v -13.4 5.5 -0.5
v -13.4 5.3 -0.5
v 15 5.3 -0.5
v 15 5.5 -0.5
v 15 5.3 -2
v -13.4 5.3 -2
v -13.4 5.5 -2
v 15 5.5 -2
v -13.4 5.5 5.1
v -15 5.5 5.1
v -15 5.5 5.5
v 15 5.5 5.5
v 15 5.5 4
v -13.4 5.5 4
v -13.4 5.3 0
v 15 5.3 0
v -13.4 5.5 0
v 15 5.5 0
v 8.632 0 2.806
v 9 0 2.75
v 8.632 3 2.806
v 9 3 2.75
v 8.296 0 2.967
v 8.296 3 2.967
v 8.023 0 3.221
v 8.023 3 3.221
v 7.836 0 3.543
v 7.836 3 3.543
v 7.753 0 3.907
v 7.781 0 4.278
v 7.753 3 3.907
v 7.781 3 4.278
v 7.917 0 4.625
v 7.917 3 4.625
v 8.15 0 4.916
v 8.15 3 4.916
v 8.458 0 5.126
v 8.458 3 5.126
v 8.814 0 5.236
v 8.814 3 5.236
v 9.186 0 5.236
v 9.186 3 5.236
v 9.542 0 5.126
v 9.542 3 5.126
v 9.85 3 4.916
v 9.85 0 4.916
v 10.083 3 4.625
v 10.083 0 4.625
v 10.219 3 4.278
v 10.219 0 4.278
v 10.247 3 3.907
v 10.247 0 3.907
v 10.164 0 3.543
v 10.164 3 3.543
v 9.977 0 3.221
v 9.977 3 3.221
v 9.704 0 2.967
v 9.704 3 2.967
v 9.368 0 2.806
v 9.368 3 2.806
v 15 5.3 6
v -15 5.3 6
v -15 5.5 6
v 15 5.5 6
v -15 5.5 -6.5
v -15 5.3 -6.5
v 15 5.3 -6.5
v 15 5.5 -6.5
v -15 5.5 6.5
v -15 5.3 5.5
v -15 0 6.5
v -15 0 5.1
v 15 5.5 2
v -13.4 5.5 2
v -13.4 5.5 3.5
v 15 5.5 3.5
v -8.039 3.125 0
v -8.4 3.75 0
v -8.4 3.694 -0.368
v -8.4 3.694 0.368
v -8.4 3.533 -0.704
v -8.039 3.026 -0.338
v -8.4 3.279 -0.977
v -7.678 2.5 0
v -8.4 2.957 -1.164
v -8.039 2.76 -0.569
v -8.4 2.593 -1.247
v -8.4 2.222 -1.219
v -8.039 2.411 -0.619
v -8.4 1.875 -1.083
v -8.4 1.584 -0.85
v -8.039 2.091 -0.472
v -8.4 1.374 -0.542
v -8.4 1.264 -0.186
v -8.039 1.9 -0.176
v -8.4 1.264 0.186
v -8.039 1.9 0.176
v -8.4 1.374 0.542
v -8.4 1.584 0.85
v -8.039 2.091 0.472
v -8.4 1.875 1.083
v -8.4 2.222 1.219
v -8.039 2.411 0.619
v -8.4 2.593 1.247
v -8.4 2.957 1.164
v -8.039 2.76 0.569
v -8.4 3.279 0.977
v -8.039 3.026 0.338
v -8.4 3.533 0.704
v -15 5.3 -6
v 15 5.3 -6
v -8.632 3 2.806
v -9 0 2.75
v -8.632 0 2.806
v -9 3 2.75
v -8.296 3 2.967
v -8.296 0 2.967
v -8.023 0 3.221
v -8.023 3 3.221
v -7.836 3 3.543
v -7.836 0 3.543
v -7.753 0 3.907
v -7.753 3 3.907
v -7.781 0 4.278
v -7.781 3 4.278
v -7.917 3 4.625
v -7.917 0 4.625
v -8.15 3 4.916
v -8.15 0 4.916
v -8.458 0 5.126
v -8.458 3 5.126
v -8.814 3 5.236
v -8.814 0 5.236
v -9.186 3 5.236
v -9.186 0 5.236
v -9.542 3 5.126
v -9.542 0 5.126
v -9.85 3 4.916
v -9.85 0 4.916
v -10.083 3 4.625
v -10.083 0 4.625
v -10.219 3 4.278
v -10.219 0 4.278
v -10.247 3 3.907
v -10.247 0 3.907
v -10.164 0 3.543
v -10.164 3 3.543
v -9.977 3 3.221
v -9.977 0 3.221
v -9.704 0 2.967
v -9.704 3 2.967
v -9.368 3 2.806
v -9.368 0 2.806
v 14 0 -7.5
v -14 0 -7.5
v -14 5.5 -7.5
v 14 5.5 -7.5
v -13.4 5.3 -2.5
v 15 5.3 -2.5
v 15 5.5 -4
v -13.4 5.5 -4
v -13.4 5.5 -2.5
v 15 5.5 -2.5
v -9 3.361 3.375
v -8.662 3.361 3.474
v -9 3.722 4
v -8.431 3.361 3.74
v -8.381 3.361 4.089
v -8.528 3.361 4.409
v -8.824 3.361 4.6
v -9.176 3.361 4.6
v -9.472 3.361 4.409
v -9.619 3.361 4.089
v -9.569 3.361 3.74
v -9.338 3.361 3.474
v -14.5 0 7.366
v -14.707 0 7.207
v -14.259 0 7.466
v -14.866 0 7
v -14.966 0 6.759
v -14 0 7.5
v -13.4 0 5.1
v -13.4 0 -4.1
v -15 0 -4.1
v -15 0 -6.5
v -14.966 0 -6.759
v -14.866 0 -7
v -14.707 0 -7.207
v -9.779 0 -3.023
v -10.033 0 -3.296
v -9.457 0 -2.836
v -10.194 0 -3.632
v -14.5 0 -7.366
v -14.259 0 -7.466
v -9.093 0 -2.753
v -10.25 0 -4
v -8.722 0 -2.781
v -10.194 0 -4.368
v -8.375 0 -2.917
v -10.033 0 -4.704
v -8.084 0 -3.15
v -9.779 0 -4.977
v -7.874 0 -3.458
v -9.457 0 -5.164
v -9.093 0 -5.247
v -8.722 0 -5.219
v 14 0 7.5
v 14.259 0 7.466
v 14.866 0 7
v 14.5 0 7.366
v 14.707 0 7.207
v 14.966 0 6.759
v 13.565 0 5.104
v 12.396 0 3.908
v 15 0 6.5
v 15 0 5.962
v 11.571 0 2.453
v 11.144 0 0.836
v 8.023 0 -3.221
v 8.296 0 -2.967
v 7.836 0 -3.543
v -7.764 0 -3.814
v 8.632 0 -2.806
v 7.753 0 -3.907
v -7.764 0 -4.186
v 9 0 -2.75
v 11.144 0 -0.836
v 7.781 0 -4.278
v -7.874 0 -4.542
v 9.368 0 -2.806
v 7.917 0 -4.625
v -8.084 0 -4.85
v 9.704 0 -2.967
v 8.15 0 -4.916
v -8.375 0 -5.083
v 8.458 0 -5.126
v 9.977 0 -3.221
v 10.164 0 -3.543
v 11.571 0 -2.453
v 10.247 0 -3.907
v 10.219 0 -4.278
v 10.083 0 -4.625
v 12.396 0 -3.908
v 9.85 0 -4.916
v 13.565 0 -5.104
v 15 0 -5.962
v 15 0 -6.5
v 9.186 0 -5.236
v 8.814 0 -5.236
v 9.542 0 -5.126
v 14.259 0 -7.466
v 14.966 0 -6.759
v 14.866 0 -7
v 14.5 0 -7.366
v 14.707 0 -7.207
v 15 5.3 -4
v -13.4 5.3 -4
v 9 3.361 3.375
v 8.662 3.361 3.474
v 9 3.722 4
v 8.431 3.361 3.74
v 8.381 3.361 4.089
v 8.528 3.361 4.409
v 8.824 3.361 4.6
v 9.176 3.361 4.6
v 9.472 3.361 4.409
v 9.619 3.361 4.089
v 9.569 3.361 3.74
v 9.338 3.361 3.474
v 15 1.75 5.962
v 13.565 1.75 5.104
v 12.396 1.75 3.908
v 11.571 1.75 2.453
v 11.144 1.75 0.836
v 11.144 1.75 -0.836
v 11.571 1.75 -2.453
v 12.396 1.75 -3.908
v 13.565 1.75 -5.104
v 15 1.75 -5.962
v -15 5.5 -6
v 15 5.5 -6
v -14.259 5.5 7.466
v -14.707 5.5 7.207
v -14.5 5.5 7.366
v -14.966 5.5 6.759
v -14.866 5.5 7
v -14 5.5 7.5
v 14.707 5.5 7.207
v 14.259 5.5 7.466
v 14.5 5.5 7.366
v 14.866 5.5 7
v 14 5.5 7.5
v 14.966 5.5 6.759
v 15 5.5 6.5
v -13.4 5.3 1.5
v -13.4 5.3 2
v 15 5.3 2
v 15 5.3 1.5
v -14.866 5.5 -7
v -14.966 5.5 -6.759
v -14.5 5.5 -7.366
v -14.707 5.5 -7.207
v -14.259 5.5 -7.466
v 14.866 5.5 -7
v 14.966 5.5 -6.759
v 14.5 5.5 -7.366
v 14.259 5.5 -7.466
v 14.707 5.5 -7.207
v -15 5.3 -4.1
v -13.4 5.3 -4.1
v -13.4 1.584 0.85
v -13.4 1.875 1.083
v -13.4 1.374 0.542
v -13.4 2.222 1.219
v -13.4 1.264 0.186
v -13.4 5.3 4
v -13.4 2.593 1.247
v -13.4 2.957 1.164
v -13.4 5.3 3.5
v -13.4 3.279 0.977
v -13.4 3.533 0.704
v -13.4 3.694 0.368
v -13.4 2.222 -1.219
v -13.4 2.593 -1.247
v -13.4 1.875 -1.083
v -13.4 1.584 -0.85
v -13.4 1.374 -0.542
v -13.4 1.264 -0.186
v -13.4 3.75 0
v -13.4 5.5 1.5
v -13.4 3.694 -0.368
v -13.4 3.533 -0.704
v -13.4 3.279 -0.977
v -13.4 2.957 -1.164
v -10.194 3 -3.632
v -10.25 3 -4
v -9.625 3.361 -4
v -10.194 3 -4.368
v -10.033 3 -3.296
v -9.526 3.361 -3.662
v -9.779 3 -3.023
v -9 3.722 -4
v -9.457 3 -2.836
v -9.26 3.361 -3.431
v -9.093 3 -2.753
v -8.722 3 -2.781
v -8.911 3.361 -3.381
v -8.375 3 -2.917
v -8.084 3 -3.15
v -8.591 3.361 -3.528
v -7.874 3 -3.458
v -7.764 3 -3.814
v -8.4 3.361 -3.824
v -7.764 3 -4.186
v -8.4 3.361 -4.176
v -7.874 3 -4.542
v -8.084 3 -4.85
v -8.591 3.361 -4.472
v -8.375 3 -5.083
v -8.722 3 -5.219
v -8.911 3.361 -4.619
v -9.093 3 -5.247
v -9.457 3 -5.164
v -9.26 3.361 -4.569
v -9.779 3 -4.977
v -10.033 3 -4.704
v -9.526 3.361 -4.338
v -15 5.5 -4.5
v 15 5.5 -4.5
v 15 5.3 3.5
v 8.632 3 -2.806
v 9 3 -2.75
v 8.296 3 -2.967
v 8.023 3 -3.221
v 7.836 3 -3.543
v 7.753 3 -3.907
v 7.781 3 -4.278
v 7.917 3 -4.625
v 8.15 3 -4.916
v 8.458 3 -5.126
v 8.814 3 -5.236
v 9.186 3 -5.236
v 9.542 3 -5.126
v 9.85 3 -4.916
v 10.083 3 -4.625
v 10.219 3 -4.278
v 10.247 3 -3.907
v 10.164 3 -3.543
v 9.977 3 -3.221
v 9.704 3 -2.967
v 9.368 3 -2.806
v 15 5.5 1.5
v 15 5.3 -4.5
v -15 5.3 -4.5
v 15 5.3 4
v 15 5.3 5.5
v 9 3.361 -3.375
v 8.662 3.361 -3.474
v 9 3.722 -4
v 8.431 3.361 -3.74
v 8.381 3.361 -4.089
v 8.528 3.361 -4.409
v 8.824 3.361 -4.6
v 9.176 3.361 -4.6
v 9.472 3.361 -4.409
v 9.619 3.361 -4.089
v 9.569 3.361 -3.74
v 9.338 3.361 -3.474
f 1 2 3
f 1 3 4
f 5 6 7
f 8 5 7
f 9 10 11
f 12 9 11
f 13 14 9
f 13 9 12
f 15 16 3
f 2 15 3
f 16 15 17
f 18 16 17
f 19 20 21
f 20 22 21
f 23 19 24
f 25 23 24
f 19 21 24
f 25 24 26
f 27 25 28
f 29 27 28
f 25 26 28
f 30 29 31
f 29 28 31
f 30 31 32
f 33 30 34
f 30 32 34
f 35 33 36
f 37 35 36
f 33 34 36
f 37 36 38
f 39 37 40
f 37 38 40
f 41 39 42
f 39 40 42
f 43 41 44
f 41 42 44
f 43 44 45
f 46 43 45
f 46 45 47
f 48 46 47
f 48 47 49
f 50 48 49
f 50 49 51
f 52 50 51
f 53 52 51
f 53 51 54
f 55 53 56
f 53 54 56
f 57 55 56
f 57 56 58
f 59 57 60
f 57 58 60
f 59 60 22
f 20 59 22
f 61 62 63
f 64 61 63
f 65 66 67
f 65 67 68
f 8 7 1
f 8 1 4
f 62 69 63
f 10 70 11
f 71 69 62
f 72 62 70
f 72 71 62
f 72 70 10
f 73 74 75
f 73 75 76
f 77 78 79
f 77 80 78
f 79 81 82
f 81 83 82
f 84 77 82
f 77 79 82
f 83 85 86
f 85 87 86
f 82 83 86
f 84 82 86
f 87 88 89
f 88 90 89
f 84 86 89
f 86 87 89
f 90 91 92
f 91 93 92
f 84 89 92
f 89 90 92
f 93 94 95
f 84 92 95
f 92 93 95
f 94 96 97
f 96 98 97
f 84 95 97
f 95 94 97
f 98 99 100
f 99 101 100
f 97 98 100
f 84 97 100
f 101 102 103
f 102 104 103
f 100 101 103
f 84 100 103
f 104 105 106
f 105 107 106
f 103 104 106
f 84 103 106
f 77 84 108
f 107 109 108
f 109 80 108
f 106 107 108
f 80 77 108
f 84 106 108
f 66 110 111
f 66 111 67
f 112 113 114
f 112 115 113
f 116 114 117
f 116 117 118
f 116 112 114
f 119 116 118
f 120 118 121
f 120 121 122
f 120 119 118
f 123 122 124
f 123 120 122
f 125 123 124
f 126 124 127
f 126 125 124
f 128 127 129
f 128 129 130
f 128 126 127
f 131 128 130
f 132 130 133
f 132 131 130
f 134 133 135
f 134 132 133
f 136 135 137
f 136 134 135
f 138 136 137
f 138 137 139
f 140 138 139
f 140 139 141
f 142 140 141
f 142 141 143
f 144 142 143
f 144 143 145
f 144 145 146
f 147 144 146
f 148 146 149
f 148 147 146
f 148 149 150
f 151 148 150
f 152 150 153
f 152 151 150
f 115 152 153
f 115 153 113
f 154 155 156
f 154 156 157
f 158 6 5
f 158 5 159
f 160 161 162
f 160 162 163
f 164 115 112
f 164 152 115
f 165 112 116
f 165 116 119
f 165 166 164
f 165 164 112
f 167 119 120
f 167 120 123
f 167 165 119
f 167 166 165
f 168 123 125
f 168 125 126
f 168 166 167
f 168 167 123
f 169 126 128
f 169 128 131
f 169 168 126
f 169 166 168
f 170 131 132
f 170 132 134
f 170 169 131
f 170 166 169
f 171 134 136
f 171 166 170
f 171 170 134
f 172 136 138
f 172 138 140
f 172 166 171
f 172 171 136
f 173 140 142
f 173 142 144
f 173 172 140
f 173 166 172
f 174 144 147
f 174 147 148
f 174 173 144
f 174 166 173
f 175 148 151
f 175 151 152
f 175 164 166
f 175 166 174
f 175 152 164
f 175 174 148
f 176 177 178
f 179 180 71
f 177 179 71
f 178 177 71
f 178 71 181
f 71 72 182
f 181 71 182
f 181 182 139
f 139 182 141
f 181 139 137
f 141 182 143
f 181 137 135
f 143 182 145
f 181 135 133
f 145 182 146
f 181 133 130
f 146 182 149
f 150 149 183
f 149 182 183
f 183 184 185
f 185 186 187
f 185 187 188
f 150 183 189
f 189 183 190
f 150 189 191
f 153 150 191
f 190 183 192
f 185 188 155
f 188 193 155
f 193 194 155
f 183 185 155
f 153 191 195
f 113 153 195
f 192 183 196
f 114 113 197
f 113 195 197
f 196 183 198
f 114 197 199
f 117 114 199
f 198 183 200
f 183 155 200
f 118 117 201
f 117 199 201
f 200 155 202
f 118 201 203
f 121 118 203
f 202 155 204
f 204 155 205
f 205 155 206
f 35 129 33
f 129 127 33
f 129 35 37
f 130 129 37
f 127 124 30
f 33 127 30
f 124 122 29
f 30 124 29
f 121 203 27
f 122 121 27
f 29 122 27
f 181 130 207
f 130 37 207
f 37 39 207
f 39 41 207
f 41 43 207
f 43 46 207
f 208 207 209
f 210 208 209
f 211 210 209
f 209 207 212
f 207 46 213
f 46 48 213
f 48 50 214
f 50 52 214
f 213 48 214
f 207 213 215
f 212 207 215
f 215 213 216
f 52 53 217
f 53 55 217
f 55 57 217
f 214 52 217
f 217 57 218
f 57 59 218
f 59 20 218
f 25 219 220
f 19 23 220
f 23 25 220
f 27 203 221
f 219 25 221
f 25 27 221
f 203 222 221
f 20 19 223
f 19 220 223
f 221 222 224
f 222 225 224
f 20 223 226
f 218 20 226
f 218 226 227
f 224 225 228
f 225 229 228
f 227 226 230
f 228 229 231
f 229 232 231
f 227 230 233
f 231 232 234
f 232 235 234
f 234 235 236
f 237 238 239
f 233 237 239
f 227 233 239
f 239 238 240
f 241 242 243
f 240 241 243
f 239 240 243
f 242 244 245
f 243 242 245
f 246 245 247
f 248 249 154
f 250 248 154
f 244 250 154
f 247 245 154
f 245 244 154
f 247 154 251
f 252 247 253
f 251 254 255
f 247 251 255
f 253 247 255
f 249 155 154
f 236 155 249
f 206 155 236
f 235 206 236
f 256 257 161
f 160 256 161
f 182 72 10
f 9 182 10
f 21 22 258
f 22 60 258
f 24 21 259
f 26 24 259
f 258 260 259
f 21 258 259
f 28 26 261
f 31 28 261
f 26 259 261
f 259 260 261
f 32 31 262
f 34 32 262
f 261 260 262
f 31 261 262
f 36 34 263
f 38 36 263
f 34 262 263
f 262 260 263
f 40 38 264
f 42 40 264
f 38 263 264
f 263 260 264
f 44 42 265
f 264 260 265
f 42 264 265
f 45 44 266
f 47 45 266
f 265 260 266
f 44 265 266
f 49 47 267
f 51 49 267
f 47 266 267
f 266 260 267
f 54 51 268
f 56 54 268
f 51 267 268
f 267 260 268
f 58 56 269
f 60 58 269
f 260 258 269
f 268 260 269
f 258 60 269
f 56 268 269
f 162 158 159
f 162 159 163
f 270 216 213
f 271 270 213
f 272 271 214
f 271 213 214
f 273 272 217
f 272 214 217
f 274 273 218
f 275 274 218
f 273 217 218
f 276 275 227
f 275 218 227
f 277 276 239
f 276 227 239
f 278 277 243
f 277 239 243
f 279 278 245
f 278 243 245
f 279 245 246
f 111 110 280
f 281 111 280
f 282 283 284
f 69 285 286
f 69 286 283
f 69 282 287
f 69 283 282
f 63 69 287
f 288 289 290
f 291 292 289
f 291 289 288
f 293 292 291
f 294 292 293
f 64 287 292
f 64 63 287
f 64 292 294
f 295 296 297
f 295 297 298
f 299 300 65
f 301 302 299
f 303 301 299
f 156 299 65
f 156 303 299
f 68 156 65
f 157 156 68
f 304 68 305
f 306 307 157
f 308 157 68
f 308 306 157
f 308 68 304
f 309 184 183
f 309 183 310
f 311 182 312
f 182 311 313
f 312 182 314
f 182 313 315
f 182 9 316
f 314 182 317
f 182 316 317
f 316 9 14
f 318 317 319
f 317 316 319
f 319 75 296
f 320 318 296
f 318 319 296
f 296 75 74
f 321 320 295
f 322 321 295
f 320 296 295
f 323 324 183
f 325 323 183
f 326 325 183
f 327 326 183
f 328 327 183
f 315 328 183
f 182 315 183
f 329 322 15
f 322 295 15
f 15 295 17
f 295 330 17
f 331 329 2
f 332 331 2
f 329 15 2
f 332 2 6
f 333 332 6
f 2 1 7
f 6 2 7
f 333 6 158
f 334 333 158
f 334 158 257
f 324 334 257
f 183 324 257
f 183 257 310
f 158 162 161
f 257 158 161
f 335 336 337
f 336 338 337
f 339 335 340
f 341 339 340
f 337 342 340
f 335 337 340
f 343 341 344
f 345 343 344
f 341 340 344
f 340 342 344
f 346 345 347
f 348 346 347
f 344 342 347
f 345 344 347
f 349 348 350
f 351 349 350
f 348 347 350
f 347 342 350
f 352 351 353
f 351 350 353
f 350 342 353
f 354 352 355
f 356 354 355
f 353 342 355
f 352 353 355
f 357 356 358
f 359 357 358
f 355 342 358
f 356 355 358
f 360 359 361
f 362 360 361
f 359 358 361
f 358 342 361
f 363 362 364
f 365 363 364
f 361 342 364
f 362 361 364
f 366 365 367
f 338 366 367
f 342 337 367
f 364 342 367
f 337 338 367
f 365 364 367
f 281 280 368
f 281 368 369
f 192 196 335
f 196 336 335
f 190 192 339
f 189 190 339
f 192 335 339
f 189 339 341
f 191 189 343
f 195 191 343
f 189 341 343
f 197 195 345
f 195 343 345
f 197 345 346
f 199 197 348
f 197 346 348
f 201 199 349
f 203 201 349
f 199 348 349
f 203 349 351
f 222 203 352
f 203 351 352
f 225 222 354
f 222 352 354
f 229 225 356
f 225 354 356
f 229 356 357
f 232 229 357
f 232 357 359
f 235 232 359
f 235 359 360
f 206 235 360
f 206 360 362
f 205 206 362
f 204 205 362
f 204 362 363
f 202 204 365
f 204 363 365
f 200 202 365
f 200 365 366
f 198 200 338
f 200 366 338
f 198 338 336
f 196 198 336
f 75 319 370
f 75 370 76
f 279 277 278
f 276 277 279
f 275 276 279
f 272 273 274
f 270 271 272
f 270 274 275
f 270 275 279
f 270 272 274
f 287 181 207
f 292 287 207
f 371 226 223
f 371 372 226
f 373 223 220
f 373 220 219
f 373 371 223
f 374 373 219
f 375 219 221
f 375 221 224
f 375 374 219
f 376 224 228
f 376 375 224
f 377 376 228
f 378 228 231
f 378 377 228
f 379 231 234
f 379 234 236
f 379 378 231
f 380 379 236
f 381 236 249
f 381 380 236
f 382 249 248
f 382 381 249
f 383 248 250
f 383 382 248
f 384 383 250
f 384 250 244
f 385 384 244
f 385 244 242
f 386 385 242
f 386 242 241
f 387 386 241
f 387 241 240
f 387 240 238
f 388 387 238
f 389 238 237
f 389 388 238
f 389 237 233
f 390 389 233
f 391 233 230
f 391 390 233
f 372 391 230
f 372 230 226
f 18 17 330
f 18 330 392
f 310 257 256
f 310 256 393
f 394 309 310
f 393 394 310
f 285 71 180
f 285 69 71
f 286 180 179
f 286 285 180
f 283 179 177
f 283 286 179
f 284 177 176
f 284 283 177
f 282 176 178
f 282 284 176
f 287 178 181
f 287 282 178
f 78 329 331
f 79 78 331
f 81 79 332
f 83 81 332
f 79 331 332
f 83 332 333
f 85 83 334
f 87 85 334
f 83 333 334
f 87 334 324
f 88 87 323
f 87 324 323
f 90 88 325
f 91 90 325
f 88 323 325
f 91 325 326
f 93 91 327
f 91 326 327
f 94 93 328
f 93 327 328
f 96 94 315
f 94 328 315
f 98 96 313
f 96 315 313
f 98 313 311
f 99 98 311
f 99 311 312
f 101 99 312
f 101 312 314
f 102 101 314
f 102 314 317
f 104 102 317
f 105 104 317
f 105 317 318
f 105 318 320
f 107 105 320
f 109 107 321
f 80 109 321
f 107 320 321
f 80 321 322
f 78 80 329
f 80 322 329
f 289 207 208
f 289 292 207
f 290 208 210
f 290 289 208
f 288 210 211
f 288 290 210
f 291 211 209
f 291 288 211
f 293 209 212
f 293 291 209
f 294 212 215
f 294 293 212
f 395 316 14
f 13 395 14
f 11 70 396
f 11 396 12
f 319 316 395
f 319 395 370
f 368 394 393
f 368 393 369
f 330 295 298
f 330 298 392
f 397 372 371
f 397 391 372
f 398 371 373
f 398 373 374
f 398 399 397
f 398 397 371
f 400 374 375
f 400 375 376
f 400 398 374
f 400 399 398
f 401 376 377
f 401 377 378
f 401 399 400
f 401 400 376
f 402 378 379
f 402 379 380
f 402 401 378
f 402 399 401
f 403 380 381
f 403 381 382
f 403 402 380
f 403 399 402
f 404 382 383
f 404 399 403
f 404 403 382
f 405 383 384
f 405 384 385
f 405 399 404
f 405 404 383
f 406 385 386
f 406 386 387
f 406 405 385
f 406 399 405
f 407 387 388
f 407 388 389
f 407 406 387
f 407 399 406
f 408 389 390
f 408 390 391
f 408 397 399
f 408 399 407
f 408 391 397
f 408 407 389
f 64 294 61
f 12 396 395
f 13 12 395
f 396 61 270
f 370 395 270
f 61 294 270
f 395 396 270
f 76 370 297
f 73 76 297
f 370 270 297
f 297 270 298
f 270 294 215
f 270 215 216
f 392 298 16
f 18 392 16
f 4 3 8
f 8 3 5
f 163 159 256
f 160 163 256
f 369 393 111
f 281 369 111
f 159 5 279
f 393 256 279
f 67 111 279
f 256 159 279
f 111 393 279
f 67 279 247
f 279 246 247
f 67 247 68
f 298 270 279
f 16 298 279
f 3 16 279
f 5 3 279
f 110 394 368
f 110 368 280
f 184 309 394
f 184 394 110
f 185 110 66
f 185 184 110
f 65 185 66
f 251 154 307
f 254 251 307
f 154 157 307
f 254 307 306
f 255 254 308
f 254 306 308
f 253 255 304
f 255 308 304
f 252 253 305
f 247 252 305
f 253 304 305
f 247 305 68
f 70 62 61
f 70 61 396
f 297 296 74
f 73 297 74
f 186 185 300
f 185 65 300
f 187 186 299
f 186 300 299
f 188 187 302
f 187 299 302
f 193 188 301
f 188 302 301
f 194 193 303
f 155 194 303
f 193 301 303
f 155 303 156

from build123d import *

# Parameters (mm, degrees)
SKETCH1_W               = 30
SKETCH1_H               = 15
BOSS_EXTRUDE1_DEPTH     = 5.5
CUT_EXTRUDE2_DEPTH      = 18.649362595
CUT_EXTRUDE2_DEPTH_BACK = 18.649362595
SKETCH2_W               = 0.5
SKETCH2_H               = 0.2
SKETCH5_W               = 9.2
SKETCH5_H               = 5.5
CUT_EXTRUDE4_DEPTH      = 1.6
SKETCH7_R               = 6.5
CUT_EXTRUDE6_DEPTH      = 1.75
FILLET1_R               = 1


with BuildPart() as part:
    # Sketch1 → Boss-Extrude1 (new body)
    with BuildSketch(Plane(origin=(0, 0, 0), x_dir=(1, 0, 0), z_dir=(0, 1, 0))):
        Rectangle(SKETCH1_W, SKETCH1_H)
    extrude(amount=BOSS_EXTRUDE1_DEPTH)

    # Sketch2 → Cut-Extrude2 (cut, two sides: drawn at the far end of the back side and taken through both)
    with BuildSketch(Plane(origin=(0, 0, 0), x_dir=(0, 0, -1), z_dir=(1, 0, 0)).offset(-CUT_EXTRUDE2_DEPTH_BACK)):
        with Locations((-5.75, 5.4)):
            Rectangle(SKETCH2_W, SKETCH2_H)
        with Locations((-3.75, 5.4)):
            Rectangle(SKETCH2_W, SKETCH2_H)
        with Locations((-1.75, 5.4)):
            Rectangle(SKETCH2_W, SKETCH2_H)
        with Locations((0.25, 5.4)):
            Rectangle(SKETCH2_W, SKETCH2_H)
        with Locations((2.25, 5.4)):
            Rectangle(SKETCH2_W, SKETCH2_H)
        with Locations((4.25, 5.4)):
            Rectangle(SKETCH2_W, SKETCH2_H)
        with Locations((6.25, 5.4)):
            Rectangle(SKETCH2_W, SKETCH2_H)
    extrude(amount=CUT_EXTRUDE2_DEPTH + CUT_EXTRUDE2_DEPTH_BACK, mode=Mode.SUBTRACT)

    # Sketch8 → Cut-Revolve1 (revolve, cut)
    with BuildSketch(Plane.XY.offset(4), mode=Mode.PRIVATE) as cut_revolve1_sk:
        Polygon((10.25, 0), (10.25, 3), (9, 3.721687836), (9, 0), align=None)
    cut_revolve1 = revolve(cut_revolve1_sk.sketch.rotate(Axis((9, 0, 4), (0, 1, 0)), 90), axis=Axis((9, 0, 4), (0, 1, 0)), mode=Mode.SUBTRACT)

    # Mirror1: Cut-Revolve1 across plane
    add(cut_revolve1.mirror(Plane.XY), mode=Mode.SUBTRACT)

    # Mirror2: Cut-Revolve1 across plane
    add(cut_revolve1.mirror(Plane(origin=(0, 0, 0), x_dir=(0, 0, 1), z_dir=(1, 0, 0))), mode=Mode.SUBTRACT)

    # Mirror2 copy 1 sketch → Mirror2 copy 1 (revolve, cut)
    with BuildSketch(Plane(origin=(0, 0, -4), x_dir=(-1, 0, 0), z_dir=(0, 0, -1))):
        Polygon((10.25, 0), (10.25, 3), (9, 3.721687836), (9, 0), align=None)
    revolve(axis=Axis((-9, 0, -4), (0, 1, 0)), mode=Mode.SUBTRACT)

    # Sketch5 → Cut-Extrude4 (cut)
    with BuildSketch(Plane(origin=(-15, 0, 0), x_dir=(0, 0, -1), z_dir=(1, 0, 0))):
        with Locations((-0.5, 2.75)):
            Rectangle(SKETCH5_W, SKETCH5_H)
    extrude(amount=CUT_EXTRUDE4_DEPTH, mode=Mode.SUBTRACT)

    # Sketch9 → Cut-Revolve2 (revolve, cut)
    with BuildSketch(Plane.XY):
        Polygon((-15, 2.5), (-7.678312164, 2.5), (-8.4, 3.75), (-15, 3.75), align=None)
    revolve(axis=Axis((-15, 2.5, 0), (-1, 0, 0)), mode=Mode.SUBTRACT)

    # Sketch7 → Cut-Extrude6 (cut)
    with BuildSketch(Plane.XZ):
        with Locations((17.59, 0)):
            Circle(SKETCH7_R)
    extrude(amount=-CUT_EXTRUDE6_DEPTH, mode=Mode.SUBTRACT)

    # Fillet1
    fillet1_edges = [part.edges().sort_by_distance(p)[0] for p in [
        (-15, 2.75, -7.5),
        (15, 2.75, -7.5),
        (15, 2.75, 7.5),
        (-15, 2.75, 7.5),
    ]]
    fillet(fillet1_edges, radius=FILLET1_R - 0.0001)  # a hair under: the kernel refuses the full size


solid = part.part
